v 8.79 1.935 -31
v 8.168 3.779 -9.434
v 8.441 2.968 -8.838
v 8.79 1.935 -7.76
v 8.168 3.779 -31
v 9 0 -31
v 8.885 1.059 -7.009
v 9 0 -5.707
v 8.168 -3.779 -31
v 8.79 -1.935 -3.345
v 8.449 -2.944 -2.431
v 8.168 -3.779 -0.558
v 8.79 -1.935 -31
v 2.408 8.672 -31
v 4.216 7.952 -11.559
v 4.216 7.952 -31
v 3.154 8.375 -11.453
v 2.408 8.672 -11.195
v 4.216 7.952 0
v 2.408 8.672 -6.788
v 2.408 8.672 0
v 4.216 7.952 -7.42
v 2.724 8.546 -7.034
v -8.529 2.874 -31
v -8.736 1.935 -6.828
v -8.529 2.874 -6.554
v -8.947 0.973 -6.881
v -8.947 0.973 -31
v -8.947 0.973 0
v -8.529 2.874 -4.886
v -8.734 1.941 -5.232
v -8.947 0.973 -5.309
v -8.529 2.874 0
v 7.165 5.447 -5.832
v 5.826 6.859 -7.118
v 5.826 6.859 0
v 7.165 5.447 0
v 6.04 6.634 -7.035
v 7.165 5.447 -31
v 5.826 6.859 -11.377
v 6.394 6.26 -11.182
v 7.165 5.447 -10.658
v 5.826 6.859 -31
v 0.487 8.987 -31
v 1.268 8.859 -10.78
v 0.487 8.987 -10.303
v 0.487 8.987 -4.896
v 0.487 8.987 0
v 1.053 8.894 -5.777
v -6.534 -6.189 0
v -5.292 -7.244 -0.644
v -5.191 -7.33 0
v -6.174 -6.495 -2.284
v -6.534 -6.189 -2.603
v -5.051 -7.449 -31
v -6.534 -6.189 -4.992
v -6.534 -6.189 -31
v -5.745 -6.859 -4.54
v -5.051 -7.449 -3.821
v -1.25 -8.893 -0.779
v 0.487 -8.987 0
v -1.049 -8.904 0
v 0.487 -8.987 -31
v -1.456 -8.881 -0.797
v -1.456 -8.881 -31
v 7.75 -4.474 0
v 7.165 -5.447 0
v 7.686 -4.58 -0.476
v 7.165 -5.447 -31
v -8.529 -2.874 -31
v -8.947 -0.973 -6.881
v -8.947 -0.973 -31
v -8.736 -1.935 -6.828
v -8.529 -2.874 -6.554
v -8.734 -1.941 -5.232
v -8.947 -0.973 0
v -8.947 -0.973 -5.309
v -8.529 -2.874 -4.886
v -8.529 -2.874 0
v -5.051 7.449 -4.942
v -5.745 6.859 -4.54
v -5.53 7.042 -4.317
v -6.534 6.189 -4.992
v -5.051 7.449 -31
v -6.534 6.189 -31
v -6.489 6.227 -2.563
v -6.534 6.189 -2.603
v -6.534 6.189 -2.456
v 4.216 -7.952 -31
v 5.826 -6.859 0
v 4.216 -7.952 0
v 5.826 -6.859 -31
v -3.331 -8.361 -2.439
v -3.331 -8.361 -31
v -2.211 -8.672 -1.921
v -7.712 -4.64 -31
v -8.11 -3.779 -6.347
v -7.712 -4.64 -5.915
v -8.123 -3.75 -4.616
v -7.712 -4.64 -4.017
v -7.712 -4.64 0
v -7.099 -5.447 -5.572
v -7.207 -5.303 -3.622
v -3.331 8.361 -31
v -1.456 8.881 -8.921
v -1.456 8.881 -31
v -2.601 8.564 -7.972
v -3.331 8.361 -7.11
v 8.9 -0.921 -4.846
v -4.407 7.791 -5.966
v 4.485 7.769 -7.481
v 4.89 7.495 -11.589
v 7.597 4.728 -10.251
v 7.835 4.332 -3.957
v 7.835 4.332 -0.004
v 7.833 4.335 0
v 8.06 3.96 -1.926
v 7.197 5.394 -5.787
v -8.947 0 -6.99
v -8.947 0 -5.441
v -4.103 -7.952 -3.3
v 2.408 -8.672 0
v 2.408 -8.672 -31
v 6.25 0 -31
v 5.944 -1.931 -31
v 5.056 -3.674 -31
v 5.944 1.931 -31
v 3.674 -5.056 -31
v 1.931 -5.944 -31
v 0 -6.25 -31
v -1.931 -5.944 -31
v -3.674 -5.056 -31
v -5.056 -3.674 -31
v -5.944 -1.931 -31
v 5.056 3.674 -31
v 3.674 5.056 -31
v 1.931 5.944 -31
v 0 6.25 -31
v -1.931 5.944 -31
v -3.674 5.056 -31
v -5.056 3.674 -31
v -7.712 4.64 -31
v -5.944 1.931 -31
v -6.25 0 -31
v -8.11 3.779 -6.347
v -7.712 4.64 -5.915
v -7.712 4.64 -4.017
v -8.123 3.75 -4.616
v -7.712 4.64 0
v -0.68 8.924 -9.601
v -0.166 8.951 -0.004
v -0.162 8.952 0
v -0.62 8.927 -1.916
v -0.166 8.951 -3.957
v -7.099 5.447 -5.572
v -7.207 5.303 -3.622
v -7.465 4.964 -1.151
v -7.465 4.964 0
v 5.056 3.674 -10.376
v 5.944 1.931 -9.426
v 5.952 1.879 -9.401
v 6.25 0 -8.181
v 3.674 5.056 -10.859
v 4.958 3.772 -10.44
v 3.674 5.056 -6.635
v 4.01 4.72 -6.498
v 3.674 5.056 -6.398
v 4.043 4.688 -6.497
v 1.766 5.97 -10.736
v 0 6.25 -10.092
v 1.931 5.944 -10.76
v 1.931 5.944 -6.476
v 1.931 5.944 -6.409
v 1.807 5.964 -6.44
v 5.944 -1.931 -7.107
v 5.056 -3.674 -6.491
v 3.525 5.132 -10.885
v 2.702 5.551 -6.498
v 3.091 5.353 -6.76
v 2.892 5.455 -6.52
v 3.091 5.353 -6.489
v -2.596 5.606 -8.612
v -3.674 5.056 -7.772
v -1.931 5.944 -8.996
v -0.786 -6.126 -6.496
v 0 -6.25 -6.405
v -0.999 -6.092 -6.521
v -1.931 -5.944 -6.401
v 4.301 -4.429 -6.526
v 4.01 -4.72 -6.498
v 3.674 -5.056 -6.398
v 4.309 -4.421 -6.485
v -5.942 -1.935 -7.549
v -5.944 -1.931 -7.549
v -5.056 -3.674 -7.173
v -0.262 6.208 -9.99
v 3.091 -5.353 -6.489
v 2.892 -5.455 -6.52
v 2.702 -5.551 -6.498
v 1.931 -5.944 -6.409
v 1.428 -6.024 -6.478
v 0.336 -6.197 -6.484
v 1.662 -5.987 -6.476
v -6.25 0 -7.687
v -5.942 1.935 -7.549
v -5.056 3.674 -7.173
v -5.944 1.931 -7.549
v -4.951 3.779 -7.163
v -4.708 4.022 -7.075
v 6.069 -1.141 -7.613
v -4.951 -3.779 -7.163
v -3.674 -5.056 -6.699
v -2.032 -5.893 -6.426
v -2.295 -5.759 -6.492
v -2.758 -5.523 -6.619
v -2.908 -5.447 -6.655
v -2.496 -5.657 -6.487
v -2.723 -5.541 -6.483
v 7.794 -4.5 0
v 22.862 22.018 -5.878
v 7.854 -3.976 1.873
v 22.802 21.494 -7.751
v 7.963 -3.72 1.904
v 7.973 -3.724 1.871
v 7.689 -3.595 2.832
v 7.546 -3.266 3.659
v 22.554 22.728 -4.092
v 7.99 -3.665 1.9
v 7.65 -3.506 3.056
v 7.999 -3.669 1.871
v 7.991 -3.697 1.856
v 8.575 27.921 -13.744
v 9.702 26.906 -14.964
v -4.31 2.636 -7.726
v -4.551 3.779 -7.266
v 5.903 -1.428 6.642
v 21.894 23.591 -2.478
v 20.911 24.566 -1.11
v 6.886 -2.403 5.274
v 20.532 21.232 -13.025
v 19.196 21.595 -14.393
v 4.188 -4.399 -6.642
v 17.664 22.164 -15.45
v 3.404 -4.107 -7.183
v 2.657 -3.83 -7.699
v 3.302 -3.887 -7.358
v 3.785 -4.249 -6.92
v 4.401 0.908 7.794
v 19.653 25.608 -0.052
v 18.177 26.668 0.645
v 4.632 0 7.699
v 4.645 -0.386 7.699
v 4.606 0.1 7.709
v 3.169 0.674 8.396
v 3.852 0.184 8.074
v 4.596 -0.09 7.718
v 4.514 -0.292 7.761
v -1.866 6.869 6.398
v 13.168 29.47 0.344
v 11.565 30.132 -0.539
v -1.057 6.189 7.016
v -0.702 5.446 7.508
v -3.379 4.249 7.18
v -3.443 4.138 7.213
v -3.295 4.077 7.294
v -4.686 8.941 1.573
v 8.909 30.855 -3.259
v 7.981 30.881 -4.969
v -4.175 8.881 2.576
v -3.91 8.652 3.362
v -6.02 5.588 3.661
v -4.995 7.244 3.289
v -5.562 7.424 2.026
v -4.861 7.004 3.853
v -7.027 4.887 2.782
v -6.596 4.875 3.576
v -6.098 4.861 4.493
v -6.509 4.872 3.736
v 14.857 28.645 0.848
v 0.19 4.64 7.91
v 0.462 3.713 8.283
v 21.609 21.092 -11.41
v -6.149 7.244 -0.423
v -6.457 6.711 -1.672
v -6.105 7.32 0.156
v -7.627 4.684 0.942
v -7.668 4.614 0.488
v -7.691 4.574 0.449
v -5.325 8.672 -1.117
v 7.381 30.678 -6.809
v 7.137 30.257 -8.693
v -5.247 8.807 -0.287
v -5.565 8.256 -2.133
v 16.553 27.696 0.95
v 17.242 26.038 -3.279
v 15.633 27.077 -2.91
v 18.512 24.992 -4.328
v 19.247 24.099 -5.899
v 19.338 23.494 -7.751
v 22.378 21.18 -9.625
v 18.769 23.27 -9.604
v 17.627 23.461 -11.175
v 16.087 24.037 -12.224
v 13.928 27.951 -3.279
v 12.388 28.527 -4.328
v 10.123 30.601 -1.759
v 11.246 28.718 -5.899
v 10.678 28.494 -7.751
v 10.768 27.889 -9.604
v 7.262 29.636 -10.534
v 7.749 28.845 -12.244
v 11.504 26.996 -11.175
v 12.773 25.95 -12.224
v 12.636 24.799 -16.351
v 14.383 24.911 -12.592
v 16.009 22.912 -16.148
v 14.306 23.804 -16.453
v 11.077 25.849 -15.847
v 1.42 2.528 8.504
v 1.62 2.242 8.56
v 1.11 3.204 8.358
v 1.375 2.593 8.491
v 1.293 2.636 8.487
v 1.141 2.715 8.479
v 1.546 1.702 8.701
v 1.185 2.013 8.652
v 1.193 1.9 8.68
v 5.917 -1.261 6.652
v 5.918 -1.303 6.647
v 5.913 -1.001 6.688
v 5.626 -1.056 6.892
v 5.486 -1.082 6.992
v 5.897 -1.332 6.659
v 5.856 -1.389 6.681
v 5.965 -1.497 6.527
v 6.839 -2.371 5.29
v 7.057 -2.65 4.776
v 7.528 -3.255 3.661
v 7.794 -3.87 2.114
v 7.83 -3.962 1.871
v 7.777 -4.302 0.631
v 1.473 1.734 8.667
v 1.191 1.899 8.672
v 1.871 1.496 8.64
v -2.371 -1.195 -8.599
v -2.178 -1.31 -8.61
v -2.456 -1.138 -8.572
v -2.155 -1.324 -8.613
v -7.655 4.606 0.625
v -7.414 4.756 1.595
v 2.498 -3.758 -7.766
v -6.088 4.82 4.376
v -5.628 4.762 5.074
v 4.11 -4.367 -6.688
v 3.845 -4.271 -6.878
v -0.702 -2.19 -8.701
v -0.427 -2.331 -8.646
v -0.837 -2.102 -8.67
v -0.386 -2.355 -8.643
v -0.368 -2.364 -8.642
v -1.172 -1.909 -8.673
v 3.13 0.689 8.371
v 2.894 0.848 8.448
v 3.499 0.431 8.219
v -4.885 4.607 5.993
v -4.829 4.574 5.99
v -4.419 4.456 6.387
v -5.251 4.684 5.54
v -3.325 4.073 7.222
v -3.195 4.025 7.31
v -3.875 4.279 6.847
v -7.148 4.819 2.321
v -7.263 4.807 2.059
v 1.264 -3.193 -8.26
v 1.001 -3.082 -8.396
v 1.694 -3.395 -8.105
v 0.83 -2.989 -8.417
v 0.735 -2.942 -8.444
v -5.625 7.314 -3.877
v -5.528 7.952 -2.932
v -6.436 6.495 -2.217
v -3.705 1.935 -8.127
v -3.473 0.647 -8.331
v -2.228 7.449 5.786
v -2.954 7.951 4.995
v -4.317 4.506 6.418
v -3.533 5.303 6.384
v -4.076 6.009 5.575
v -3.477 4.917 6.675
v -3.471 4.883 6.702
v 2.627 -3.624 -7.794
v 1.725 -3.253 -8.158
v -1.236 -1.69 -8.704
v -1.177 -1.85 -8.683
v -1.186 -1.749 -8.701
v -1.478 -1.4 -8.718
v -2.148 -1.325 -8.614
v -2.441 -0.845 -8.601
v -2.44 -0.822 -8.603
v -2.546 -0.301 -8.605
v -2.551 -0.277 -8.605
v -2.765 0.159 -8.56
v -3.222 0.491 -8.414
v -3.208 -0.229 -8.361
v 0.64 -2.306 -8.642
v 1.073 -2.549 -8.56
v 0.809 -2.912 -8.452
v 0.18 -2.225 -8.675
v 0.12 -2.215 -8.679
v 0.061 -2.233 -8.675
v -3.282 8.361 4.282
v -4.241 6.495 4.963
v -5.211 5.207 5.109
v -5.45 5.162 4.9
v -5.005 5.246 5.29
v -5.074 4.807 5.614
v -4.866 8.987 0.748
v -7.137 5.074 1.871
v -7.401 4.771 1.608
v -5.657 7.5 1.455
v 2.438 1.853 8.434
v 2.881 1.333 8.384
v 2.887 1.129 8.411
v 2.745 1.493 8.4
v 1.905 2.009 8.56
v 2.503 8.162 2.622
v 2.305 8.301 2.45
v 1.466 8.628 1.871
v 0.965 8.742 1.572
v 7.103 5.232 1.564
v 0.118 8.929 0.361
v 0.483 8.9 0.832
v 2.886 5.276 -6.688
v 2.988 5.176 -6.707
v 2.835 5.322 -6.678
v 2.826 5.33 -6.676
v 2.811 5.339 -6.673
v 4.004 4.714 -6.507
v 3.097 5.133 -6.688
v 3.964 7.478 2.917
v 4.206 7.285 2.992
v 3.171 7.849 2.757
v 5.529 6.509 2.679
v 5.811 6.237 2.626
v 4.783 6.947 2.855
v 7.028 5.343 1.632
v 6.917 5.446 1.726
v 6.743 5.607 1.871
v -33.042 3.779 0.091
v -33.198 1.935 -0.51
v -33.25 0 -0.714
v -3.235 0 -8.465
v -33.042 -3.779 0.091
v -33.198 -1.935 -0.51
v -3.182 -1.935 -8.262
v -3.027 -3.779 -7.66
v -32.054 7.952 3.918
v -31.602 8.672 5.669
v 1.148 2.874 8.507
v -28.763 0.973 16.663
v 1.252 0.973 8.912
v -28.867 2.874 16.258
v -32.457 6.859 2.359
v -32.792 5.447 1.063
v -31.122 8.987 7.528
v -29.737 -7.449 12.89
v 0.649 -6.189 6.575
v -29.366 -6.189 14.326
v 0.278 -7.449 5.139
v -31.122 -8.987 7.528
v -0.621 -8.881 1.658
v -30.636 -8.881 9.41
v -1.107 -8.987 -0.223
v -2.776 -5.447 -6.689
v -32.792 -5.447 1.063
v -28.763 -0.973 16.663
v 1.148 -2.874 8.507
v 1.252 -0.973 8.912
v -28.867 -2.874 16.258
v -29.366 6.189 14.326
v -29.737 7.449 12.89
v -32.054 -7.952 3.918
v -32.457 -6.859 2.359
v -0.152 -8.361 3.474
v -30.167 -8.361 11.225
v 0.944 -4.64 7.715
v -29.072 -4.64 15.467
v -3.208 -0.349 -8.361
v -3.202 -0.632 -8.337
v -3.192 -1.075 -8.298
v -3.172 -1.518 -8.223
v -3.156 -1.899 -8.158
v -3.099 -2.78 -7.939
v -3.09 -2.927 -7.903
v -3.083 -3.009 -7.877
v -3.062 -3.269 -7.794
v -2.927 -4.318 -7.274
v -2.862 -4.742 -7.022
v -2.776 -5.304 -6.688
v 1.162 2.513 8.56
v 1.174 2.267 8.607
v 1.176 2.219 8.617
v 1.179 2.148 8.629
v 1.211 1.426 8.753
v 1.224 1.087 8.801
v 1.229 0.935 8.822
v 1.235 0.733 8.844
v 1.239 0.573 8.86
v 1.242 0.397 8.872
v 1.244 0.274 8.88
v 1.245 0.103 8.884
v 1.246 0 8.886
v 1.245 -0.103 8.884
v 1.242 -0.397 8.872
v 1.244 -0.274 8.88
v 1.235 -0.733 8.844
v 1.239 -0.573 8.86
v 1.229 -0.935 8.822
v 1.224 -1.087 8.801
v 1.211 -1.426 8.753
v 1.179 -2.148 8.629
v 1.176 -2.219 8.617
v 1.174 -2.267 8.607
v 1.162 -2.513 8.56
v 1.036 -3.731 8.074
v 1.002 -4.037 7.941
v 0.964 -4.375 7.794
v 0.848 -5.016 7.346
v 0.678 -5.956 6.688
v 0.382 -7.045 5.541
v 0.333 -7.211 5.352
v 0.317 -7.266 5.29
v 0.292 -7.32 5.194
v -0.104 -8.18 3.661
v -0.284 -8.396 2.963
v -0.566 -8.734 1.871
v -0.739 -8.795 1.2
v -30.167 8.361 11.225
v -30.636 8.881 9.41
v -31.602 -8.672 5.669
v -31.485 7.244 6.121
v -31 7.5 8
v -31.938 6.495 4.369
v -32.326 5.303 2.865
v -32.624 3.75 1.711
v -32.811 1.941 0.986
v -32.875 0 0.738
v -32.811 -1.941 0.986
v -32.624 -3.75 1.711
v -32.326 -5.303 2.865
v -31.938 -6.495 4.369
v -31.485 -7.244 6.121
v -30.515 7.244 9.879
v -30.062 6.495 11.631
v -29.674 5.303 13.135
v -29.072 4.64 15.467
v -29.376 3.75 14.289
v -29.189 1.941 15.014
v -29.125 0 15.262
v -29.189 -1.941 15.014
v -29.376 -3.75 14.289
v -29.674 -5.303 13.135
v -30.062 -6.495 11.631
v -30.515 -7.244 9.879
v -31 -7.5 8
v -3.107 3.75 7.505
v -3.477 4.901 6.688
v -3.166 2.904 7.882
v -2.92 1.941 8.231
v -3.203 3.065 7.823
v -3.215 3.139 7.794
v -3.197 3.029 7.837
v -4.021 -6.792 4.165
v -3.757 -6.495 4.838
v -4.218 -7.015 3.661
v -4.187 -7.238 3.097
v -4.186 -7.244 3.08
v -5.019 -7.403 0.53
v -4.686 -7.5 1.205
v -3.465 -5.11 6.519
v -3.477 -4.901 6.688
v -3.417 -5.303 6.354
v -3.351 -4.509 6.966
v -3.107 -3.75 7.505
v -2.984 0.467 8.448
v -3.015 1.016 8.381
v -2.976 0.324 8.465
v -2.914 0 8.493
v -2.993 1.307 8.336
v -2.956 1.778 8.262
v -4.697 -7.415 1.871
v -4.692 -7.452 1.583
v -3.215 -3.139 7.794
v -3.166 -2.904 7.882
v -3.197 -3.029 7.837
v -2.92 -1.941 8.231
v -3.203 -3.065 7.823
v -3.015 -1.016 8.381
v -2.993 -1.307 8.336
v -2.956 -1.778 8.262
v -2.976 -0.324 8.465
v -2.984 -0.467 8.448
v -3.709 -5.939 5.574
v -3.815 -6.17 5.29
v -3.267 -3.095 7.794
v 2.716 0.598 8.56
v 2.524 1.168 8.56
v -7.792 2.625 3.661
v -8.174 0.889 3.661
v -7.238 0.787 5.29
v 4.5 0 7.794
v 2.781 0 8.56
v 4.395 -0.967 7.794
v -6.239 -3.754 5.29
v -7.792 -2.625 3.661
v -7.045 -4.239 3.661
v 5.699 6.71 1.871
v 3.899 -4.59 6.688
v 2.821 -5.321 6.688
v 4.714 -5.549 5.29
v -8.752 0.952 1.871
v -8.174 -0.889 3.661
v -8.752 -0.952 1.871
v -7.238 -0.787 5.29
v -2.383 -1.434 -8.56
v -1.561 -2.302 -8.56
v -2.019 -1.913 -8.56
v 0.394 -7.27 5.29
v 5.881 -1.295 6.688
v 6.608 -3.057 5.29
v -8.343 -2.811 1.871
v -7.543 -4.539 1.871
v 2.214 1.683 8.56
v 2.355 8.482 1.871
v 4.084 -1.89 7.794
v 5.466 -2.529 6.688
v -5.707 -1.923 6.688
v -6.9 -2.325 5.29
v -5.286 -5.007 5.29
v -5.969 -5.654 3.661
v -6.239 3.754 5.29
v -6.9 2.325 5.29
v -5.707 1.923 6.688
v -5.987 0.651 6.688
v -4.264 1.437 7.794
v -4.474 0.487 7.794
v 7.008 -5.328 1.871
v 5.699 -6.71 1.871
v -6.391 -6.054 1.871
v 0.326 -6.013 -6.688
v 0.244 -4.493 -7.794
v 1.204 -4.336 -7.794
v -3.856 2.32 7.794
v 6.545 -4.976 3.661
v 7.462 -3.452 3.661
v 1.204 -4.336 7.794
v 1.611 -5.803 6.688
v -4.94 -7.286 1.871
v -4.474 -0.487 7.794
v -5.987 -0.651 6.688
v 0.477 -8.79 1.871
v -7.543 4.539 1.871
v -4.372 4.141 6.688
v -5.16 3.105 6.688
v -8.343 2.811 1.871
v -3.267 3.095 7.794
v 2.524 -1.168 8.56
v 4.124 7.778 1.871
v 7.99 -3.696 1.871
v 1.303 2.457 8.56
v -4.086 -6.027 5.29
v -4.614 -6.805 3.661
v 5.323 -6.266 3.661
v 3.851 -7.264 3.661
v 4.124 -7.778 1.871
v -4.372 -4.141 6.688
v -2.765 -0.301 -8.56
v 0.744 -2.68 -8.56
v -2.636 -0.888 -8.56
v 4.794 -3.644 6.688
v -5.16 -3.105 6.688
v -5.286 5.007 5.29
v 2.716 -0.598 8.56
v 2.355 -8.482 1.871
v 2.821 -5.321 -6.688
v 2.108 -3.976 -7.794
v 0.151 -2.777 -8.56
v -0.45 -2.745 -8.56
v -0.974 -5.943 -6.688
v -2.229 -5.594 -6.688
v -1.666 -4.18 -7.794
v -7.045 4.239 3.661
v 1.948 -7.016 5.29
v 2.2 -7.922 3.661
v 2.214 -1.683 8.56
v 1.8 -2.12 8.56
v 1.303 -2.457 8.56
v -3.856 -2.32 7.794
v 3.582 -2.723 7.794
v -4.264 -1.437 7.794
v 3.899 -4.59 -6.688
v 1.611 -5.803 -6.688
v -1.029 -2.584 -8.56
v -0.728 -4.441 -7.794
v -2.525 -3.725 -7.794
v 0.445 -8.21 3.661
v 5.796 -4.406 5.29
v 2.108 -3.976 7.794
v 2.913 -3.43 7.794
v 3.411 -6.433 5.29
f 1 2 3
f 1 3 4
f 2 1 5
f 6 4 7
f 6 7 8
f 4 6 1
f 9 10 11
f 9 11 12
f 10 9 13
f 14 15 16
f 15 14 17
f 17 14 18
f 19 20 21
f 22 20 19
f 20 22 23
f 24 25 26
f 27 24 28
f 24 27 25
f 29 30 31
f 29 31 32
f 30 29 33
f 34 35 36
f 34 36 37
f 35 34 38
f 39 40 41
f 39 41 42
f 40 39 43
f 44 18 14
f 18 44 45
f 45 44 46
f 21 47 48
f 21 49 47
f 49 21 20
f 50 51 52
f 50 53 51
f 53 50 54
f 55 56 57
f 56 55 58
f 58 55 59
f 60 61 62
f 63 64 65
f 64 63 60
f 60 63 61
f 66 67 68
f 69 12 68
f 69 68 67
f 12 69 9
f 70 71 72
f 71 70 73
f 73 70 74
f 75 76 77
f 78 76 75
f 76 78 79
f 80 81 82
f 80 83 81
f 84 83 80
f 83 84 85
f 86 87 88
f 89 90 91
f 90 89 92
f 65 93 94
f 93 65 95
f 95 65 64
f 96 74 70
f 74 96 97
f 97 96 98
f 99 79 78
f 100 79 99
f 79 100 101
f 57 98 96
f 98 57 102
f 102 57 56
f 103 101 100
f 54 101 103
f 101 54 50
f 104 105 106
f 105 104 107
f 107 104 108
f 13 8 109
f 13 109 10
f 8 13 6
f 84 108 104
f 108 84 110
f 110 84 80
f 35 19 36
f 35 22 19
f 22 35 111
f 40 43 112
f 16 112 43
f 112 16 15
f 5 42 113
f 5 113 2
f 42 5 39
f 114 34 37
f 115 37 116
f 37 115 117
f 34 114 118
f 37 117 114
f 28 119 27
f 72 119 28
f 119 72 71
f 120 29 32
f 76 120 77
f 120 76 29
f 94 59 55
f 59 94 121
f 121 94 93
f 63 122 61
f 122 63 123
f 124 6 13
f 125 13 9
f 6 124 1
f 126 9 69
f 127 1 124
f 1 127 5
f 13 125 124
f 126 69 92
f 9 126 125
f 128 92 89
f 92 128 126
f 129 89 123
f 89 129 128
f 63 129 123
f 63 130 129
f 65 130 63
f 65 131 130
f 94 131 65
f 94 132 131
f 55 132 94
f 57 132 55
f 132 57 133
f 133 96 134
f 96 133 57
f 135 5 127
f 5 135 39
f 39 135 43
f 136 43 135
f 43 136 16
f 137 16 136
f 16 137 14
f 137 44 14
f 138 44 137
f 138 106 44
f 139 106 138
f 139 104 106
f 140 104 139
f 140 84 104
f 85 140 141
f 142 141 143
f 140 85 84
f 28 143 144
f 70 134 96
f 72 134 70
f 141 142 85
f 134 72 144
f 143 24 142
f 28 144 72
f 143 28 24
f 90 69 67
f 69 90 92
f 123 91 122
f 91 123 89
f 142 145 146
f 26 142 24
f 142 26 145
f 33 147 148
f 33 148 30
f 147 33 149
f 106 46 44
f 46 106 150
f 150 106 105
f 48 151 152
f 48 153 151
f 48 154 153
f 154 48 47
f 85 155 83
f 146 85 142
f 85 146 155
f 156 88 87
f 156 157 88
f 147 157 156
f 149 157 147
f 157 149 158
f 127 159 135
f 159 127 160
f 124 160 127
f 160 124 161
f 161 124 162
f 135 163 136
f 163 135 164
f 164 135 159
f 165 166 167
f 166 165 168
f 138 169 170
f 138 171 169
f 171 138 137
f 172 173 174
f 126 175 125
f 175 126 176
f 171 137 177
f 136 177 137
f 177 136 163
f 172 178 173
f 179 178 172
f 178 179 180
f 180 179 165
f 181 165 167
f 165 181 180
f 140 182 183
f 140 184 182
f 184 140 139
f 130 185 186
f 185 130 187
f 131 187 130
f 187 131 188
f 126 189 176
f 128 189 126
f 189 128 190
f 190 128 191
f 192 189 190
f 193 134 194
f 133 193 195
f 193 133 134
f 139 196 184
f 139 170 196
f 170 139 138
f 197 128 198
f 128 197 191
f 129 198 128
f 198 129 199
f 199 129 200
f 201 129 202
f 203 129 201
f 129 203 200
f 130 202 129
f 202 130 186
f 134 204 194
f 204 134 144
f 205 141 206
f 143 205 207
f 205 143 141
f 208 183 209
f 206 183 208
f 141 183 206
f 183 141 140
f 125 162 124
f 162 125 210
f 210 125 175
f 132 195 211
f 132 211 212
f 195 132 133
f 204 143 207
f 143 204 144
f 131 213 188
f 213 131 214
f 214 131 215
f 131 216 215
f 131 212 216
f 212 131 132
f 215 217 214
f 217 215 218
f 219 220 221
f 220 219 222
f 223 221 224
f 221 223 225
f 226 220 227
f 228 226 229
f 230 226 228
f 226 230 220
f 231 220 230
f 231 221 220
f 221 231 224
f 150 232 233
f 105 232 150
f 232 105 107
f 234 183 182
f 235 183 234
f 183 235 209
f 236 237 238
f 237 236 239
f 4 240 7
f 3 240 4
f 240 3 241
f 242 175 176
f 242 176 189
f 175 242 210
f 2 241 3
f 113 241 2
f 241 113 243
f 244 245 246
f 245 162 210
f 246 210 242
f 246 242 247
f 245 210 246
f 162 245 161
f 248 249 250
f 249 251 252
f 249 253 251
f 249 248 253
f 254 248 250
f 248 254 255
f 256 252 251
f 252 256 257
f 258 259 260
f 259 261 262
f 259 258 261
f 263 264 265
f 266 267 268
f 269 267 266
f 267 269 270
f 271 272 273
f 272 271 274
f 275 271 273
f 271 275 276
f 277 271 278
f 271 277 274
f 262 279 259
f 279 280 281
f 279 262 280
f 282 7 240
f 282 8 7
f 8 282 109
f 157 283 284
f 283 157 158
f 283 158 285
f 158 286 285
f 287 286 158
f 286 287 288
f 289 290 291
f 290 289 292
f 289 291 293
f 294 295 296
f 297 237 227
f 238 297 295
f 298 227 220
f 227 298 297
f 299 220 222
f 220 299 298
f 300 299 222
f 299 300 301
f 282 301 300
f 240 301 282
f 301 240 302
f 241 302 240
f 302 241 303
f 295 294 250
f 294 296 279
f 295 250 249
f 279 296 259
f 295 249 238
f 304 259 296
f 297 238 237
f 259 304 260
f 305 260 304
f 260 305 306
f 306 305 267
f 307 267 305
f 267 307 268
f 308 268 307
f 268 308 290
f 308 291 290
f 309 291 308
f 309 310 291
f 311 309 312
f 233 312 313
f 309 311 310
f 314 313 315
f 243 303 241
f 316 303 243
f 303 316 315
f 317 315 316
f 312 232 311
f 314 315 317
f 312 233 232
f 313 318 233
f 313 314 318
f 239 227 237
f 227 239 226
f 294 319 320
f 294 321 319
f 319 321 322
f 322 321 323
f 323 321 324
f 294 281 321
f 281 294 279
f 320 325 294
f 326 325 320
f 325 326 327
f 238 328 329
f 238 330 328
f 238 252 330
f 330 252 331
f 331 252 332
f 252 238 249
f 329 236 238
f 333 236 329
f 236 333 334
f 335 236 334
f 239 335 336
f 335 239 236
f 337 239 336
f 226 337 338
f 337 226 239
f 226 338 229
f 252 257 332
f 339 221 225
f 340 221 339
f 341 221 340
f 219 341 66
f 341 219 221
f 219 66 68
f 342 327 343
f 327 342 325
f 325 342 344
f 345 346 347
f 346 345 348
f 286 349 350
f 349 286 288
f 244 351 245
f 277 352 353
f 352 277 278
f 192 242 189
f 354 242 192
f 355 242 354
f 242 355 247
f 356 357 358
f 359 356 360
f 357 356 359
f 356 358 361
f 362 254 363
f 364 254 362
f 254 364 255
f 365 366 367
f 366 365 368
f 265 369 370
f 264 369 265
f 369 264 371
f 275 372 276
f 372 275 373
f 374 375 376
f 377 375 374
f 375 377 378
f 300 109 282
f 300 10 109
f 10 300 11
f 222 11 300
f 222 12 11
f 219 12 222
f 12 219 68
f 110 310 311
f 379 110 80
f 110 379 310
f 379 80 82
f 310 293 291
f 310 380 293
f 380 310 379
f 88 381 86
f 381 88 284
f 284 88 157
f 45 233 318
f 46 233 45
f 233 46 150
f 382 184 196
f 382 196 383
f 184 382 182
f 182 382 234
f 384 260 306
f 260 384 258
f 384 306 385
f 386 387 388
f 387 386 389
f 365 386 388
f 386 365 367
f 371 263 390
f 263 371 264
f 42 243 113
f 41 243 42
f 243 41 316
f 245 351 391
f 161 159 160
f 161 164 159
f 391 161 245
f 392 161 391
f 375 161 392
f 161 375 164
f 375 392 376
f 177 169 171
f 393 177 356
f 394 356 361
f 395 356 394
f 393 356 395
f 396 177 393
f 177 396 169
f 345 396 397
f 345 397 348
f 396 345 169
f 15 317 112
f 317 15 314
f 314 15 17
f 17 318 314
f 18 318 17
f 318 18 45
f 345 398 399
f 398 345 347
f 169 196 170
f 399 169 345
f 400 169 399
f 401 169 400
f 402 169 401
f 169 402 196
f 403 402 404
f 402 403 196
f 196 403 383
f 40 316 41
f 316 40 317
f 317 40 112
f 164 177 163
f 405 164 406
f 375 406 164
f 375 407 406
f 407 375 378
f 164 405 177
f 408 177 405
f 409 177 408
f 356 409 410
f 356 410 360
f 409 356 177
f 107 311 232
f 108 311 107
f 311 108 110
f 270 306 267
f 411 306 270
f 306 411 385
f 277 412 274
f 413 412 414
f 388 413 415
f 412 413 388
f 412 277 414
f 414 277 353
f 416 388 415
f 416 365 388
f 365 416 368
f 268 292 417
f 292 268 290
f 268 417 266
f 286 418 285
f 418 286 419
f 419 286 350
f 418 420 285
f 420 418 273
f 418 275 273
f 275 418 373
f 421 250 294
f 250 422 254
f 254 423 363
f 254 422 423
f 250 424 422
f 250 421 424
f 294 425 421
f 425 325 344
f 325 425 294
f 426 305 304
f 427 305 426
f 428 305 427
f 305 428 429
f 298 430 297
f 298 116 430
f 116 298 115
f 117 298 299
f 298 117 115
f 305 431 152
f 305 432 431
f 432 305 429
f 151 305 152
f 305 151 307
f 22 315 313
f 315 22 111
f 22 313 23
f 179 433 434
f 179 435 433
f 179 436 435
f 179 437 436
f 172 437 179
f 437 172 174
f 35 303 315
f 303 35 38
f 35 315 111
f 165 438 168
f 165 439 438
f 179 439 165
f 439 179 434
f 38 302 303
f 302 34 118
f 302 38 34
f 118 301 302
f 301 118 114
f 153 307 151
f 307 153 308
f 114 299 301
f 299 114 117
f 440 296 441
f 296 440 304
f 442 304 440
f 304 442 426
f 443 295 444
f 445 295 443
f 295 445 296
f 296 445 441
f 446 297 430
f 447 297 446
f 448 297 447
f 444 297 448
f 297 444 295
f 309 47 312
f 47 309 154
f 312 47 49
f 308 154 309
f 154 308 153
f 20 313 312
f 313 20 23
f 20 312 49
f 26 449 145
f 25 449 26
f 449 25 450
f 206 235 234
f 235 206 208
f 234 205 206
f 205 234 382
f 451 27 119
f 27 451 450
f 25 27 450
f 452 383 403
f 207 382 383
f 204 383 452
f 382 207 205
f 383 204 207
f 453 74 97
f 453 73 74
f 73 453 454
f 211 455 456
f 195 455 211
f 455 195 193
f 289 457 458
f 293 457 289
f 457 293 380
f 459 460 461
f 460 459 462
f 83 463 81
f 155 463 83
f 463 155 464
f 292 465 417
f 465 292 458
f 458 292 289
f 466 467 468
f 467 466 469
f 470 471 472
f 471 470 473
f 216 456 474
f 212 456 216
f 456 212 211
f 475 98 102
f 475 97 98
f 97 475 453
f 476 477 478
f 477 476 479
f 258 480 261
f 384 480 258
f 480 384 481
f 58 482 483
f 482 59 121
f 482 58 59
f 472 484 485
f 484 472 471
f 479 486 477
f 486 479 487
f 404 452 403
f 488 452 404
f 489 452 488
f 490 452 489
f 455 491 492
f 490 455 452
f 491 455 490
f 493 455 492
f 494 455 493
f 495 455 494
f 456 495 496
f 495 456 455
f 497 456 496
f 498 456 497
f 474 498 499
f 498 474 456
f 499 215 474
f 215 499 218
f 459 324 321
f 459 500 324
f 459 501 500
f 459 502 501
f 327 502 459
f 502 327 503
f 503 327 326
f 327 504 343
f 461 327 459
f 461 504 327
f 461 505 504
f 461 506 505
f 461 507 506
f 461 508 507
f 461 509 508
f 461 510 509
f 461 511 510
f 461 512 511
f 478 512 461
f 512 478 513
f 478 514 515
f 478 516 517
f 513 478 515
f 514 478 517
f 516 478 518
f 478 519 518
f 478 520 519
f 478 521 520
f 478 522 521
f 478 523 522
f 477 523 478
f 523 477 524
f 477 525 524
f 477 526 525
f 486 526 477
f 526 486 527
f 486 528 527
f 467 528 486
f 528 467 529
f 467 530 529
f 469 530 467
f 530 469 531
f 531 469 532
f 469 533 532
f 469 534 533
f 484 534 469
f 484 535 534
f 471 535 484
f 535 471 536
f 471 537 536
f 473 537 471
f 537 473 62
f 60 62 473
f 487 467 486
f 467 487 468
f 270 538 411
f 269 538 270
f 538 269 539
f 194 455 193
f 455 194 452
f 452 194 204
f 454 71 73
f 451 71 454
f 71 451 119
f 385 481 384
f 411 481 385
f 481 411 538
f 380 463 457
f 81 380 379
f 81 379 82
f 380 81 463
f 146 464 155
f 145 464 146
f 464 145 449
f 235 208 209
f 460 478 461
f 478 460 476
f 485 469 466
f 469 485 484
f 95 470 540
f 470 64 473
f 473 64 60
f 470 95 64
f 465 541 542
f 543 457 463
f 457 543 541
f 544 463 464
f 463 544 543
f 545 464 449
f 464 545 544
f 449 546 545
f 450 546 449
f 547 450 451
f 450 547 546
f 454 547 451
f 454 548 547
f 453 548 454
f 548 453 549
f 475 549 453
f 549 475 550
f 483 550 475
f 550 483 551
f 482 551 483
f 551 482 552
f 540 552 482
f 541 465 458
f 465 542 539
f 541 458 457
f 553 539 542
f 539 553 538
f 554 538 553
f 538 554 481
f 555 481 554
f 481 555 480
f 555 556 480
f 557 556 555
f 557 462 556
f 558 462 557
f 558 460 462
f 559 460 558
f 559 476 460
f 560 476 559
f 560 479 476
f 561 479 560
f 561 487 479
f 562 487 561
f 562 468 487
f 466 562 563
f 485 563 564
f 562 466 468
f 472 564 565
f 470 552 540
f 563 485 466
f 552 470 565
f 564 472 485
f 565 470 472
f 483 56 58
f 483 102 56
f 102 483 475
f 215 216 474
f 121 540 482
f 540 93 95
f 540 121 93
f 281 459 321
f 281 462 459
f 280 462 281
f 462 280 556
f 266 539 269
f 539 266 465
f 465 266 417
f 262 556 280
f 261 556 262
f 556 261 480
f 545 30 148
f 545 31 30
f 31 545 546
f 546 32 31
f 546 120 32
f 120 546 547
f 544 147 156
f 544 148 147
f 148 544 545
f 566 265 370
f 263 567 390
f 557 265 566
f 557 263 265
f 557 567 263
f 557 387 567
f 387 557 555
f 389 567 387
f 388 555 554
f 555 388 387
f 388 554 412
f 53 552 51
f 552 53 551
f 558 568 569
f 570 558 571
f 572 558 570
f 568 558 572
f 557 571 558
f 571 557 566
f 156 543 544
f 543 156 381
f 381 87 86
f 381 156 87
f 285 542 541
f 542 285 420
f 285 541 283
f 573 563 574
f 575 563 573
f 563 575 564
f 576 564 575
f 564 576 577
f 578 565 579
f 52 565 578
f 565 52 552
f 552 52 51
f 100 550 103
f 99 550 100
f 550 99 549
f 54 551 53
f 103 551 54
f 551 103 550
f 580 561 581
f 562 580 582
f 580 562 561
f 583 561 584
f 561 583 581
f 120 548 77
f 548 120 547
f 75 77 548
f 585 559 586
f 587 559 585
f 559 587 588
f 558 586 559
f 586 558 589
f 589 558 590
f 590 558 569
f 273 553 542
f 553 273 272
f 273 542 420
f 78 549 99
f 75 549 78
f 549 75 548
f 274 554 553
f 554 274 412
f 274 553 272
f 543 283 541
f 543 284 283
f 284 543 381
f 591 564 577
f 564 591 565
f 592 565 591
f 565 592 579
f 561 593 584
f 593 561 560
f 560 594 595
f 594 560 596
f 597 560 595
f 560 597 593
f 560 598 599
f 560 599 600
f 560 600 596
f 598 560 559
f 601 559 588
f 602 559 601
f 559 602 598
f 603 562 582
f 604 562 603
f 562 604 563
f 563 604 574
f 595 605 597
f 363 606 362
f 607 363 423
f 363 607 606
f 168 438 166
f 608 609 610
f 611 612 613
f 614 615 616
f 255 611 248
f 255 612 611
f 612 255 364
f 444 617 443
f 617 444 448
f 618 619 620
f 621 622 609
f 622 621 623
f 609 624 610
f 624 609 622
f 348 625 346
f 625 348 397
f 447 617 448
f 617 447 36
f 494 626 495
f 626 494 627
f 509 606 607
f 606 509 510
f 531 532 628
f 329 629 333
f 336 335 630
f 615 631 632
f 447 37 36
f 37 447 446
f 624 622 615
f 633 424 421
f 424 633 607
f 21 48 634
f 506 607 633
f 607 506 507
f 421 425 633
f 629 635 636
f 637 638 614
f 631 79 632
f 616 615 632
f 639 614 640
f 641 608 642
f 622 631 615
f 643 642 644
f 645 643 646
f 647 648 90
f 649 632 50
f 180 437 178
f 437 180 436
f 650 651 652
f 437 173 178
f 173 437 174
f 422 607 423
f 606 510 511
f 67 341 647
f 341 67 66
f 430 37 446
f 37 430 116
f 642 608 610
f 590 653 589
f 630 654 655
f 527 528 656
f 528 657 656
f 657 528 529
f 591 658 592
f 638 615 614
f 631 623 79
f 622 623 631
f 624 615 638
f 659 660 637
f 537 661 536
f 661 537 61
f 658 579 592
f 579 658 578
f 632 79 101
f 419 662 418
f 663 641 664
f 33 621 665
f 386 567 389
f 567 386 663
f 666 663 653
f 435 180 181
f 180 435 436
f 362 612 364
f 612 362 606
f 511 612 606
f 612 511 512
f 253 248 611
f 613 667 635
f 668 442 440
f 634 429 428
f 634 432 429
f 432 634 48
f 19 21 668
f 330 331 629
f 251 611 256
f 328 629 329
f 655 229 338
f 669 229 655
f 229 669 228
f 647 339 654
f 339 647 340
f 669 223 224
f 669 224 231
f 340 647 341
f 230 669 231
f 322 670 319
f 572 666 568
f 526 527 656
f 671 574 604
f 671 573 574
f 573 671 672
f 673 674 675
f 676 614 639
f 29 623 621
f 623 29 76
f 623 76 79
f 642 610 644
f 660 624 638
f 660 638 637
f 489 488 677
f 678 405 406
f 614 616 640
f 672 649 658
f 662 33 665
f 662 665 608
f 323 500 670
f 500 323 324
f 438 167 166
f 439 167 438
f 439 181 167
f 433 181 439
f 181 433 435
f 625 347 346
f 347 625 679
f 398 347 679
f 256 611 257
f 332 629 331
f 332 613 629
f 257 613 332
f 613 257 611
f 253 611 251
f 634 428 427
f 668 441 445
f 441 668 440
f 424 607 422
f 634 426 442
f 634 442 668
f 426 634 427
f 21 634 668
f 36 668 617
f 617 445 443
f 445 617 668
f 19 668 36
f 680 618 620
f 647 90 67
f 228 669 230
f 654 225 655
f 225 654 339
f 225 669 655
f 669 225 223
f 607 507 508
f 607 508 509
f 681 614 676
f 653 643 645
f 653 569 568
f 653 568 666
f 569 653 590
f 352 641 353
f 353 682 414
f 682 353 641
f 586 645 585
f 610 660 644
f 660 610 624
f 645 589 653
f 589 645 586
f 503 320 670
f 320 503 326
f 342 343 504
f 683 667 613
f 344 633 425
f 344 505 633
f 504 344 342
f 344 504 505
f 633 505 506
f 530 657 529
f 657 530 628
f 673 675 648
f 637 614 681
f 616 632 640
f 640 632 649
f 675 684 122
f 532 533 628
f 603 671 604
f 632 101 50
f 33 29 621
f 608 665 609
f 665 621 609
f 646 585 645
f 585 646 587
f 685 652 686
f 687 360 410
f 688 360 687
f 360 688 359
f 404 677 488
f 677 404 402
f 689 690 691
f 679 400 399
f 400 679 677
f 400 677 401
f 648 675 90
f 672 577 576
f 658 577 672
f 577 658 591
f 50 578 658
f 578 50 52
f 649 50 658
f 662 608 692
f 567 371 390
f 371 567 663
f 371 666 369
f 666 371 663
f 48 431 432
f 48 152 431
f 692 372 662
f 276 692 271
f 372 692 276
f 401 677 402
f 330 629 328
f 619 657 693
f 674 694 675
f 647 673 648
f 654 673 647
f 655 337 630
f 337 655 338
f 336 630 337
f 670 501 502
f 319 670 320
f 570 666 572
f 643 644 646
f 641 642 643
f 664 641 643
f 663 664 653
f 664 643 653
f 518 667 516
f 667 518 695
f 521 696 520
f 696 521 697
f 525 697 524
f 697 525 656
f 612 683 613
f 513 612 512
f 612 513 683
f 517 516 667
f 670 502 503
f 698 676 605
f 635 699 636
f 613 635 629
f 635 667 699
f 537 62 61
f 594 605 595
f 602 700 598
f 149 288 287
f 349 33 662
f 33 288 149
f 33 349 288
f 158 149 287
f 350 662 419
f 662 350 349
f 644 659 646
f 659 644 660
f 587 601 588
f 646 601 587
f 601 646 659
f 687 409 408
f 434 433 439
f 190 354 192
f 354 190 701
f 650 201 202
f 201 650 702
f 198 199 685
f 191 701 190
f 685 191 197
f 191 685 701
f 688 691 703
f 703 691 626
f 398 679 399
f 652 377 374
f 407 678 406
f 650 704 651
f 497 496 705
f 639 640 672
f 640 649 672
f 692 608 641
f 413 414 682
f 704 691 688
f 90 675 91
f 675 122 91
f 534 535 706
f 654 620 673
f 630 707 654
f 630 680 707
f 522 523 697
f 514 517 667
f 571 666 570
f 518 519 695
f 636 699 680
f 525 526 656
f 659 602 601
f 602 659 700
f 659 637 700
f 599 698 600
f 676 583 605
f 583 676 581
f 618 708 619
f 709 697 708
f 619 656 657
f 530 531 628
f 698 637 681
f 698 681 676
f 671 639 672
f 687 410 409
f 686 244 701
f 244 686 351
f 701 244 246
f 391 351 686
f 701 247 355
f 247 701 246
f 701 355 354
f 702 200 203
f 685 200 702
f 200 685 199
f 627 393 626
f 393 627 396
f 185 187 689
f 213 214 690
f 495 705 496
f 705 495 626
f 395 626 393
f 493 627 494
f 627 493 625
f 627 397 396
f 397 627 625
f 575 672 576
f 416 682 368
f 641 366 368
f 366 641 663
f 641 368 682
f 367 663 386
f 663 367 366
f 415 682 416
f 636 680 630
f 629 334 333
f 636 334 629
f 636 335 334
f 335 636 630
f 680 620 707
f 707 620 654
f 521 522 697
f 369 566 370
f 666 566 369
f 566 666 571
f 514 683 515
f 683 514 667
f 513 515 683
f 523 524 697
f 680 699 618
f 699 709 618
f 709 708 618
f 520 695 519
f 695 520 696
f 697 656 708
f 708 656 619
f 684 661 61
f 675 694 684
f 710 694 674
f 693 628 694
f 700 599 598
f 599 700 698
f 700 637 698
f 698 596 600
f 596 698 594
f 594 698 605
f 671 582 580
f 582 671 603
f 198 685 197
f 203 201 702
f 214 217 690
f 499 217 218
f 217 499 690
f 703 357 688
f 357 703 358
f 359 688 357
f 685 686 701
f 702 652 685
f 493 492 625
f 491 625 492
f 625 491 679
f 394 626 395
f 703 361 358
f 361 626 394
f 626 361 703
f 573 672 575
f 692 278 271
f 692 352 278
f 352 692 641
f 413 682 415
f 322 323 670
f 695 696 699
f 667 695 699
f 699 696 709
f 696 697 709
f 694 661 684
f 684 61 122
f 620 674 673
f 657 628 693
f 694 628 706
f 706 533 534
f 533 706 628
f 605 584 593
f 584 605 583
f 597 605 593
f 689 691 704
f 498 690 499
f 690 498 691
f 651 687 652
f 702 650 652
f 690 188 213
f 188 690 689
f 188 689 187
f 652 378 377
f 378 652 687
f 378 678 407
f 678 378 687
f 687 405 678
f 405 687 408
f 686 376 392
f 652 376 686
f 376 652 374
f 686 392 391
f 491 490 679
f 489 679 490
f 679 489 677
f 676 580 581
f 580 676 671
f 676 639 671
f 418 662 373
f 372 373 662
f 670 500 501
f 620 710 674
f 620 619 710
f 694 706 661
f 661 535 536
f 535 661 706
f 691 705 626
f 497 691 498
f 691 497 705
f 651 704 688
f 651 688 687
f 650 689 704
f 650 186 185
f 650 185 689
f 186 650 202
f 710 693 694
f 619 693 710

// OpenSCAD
width=10;

sphere (9);

//cylinder 1 z たて
difference(){
    translate ([0,0,-31])cylinder(h=31, d=18);
    translate([0,0,-33])cylinder(h=30, d=12.5);
}

//cylinder 2
rotate([75.52,0,-30])difference(){
        translate ([0,0,-31])
        cylinder (h=31, d=18);
        translate([0,0,-32])
        cylinder(h=31, d=10); 
        }
        

//cylinder 3        
translate([-31,0,8]) rotate([0,104.48,0])difference(){
        cylinder (h=31, d=18);
        translate([0,0,+3]) ;
        cylinder(h=30, d=15); 
        }
